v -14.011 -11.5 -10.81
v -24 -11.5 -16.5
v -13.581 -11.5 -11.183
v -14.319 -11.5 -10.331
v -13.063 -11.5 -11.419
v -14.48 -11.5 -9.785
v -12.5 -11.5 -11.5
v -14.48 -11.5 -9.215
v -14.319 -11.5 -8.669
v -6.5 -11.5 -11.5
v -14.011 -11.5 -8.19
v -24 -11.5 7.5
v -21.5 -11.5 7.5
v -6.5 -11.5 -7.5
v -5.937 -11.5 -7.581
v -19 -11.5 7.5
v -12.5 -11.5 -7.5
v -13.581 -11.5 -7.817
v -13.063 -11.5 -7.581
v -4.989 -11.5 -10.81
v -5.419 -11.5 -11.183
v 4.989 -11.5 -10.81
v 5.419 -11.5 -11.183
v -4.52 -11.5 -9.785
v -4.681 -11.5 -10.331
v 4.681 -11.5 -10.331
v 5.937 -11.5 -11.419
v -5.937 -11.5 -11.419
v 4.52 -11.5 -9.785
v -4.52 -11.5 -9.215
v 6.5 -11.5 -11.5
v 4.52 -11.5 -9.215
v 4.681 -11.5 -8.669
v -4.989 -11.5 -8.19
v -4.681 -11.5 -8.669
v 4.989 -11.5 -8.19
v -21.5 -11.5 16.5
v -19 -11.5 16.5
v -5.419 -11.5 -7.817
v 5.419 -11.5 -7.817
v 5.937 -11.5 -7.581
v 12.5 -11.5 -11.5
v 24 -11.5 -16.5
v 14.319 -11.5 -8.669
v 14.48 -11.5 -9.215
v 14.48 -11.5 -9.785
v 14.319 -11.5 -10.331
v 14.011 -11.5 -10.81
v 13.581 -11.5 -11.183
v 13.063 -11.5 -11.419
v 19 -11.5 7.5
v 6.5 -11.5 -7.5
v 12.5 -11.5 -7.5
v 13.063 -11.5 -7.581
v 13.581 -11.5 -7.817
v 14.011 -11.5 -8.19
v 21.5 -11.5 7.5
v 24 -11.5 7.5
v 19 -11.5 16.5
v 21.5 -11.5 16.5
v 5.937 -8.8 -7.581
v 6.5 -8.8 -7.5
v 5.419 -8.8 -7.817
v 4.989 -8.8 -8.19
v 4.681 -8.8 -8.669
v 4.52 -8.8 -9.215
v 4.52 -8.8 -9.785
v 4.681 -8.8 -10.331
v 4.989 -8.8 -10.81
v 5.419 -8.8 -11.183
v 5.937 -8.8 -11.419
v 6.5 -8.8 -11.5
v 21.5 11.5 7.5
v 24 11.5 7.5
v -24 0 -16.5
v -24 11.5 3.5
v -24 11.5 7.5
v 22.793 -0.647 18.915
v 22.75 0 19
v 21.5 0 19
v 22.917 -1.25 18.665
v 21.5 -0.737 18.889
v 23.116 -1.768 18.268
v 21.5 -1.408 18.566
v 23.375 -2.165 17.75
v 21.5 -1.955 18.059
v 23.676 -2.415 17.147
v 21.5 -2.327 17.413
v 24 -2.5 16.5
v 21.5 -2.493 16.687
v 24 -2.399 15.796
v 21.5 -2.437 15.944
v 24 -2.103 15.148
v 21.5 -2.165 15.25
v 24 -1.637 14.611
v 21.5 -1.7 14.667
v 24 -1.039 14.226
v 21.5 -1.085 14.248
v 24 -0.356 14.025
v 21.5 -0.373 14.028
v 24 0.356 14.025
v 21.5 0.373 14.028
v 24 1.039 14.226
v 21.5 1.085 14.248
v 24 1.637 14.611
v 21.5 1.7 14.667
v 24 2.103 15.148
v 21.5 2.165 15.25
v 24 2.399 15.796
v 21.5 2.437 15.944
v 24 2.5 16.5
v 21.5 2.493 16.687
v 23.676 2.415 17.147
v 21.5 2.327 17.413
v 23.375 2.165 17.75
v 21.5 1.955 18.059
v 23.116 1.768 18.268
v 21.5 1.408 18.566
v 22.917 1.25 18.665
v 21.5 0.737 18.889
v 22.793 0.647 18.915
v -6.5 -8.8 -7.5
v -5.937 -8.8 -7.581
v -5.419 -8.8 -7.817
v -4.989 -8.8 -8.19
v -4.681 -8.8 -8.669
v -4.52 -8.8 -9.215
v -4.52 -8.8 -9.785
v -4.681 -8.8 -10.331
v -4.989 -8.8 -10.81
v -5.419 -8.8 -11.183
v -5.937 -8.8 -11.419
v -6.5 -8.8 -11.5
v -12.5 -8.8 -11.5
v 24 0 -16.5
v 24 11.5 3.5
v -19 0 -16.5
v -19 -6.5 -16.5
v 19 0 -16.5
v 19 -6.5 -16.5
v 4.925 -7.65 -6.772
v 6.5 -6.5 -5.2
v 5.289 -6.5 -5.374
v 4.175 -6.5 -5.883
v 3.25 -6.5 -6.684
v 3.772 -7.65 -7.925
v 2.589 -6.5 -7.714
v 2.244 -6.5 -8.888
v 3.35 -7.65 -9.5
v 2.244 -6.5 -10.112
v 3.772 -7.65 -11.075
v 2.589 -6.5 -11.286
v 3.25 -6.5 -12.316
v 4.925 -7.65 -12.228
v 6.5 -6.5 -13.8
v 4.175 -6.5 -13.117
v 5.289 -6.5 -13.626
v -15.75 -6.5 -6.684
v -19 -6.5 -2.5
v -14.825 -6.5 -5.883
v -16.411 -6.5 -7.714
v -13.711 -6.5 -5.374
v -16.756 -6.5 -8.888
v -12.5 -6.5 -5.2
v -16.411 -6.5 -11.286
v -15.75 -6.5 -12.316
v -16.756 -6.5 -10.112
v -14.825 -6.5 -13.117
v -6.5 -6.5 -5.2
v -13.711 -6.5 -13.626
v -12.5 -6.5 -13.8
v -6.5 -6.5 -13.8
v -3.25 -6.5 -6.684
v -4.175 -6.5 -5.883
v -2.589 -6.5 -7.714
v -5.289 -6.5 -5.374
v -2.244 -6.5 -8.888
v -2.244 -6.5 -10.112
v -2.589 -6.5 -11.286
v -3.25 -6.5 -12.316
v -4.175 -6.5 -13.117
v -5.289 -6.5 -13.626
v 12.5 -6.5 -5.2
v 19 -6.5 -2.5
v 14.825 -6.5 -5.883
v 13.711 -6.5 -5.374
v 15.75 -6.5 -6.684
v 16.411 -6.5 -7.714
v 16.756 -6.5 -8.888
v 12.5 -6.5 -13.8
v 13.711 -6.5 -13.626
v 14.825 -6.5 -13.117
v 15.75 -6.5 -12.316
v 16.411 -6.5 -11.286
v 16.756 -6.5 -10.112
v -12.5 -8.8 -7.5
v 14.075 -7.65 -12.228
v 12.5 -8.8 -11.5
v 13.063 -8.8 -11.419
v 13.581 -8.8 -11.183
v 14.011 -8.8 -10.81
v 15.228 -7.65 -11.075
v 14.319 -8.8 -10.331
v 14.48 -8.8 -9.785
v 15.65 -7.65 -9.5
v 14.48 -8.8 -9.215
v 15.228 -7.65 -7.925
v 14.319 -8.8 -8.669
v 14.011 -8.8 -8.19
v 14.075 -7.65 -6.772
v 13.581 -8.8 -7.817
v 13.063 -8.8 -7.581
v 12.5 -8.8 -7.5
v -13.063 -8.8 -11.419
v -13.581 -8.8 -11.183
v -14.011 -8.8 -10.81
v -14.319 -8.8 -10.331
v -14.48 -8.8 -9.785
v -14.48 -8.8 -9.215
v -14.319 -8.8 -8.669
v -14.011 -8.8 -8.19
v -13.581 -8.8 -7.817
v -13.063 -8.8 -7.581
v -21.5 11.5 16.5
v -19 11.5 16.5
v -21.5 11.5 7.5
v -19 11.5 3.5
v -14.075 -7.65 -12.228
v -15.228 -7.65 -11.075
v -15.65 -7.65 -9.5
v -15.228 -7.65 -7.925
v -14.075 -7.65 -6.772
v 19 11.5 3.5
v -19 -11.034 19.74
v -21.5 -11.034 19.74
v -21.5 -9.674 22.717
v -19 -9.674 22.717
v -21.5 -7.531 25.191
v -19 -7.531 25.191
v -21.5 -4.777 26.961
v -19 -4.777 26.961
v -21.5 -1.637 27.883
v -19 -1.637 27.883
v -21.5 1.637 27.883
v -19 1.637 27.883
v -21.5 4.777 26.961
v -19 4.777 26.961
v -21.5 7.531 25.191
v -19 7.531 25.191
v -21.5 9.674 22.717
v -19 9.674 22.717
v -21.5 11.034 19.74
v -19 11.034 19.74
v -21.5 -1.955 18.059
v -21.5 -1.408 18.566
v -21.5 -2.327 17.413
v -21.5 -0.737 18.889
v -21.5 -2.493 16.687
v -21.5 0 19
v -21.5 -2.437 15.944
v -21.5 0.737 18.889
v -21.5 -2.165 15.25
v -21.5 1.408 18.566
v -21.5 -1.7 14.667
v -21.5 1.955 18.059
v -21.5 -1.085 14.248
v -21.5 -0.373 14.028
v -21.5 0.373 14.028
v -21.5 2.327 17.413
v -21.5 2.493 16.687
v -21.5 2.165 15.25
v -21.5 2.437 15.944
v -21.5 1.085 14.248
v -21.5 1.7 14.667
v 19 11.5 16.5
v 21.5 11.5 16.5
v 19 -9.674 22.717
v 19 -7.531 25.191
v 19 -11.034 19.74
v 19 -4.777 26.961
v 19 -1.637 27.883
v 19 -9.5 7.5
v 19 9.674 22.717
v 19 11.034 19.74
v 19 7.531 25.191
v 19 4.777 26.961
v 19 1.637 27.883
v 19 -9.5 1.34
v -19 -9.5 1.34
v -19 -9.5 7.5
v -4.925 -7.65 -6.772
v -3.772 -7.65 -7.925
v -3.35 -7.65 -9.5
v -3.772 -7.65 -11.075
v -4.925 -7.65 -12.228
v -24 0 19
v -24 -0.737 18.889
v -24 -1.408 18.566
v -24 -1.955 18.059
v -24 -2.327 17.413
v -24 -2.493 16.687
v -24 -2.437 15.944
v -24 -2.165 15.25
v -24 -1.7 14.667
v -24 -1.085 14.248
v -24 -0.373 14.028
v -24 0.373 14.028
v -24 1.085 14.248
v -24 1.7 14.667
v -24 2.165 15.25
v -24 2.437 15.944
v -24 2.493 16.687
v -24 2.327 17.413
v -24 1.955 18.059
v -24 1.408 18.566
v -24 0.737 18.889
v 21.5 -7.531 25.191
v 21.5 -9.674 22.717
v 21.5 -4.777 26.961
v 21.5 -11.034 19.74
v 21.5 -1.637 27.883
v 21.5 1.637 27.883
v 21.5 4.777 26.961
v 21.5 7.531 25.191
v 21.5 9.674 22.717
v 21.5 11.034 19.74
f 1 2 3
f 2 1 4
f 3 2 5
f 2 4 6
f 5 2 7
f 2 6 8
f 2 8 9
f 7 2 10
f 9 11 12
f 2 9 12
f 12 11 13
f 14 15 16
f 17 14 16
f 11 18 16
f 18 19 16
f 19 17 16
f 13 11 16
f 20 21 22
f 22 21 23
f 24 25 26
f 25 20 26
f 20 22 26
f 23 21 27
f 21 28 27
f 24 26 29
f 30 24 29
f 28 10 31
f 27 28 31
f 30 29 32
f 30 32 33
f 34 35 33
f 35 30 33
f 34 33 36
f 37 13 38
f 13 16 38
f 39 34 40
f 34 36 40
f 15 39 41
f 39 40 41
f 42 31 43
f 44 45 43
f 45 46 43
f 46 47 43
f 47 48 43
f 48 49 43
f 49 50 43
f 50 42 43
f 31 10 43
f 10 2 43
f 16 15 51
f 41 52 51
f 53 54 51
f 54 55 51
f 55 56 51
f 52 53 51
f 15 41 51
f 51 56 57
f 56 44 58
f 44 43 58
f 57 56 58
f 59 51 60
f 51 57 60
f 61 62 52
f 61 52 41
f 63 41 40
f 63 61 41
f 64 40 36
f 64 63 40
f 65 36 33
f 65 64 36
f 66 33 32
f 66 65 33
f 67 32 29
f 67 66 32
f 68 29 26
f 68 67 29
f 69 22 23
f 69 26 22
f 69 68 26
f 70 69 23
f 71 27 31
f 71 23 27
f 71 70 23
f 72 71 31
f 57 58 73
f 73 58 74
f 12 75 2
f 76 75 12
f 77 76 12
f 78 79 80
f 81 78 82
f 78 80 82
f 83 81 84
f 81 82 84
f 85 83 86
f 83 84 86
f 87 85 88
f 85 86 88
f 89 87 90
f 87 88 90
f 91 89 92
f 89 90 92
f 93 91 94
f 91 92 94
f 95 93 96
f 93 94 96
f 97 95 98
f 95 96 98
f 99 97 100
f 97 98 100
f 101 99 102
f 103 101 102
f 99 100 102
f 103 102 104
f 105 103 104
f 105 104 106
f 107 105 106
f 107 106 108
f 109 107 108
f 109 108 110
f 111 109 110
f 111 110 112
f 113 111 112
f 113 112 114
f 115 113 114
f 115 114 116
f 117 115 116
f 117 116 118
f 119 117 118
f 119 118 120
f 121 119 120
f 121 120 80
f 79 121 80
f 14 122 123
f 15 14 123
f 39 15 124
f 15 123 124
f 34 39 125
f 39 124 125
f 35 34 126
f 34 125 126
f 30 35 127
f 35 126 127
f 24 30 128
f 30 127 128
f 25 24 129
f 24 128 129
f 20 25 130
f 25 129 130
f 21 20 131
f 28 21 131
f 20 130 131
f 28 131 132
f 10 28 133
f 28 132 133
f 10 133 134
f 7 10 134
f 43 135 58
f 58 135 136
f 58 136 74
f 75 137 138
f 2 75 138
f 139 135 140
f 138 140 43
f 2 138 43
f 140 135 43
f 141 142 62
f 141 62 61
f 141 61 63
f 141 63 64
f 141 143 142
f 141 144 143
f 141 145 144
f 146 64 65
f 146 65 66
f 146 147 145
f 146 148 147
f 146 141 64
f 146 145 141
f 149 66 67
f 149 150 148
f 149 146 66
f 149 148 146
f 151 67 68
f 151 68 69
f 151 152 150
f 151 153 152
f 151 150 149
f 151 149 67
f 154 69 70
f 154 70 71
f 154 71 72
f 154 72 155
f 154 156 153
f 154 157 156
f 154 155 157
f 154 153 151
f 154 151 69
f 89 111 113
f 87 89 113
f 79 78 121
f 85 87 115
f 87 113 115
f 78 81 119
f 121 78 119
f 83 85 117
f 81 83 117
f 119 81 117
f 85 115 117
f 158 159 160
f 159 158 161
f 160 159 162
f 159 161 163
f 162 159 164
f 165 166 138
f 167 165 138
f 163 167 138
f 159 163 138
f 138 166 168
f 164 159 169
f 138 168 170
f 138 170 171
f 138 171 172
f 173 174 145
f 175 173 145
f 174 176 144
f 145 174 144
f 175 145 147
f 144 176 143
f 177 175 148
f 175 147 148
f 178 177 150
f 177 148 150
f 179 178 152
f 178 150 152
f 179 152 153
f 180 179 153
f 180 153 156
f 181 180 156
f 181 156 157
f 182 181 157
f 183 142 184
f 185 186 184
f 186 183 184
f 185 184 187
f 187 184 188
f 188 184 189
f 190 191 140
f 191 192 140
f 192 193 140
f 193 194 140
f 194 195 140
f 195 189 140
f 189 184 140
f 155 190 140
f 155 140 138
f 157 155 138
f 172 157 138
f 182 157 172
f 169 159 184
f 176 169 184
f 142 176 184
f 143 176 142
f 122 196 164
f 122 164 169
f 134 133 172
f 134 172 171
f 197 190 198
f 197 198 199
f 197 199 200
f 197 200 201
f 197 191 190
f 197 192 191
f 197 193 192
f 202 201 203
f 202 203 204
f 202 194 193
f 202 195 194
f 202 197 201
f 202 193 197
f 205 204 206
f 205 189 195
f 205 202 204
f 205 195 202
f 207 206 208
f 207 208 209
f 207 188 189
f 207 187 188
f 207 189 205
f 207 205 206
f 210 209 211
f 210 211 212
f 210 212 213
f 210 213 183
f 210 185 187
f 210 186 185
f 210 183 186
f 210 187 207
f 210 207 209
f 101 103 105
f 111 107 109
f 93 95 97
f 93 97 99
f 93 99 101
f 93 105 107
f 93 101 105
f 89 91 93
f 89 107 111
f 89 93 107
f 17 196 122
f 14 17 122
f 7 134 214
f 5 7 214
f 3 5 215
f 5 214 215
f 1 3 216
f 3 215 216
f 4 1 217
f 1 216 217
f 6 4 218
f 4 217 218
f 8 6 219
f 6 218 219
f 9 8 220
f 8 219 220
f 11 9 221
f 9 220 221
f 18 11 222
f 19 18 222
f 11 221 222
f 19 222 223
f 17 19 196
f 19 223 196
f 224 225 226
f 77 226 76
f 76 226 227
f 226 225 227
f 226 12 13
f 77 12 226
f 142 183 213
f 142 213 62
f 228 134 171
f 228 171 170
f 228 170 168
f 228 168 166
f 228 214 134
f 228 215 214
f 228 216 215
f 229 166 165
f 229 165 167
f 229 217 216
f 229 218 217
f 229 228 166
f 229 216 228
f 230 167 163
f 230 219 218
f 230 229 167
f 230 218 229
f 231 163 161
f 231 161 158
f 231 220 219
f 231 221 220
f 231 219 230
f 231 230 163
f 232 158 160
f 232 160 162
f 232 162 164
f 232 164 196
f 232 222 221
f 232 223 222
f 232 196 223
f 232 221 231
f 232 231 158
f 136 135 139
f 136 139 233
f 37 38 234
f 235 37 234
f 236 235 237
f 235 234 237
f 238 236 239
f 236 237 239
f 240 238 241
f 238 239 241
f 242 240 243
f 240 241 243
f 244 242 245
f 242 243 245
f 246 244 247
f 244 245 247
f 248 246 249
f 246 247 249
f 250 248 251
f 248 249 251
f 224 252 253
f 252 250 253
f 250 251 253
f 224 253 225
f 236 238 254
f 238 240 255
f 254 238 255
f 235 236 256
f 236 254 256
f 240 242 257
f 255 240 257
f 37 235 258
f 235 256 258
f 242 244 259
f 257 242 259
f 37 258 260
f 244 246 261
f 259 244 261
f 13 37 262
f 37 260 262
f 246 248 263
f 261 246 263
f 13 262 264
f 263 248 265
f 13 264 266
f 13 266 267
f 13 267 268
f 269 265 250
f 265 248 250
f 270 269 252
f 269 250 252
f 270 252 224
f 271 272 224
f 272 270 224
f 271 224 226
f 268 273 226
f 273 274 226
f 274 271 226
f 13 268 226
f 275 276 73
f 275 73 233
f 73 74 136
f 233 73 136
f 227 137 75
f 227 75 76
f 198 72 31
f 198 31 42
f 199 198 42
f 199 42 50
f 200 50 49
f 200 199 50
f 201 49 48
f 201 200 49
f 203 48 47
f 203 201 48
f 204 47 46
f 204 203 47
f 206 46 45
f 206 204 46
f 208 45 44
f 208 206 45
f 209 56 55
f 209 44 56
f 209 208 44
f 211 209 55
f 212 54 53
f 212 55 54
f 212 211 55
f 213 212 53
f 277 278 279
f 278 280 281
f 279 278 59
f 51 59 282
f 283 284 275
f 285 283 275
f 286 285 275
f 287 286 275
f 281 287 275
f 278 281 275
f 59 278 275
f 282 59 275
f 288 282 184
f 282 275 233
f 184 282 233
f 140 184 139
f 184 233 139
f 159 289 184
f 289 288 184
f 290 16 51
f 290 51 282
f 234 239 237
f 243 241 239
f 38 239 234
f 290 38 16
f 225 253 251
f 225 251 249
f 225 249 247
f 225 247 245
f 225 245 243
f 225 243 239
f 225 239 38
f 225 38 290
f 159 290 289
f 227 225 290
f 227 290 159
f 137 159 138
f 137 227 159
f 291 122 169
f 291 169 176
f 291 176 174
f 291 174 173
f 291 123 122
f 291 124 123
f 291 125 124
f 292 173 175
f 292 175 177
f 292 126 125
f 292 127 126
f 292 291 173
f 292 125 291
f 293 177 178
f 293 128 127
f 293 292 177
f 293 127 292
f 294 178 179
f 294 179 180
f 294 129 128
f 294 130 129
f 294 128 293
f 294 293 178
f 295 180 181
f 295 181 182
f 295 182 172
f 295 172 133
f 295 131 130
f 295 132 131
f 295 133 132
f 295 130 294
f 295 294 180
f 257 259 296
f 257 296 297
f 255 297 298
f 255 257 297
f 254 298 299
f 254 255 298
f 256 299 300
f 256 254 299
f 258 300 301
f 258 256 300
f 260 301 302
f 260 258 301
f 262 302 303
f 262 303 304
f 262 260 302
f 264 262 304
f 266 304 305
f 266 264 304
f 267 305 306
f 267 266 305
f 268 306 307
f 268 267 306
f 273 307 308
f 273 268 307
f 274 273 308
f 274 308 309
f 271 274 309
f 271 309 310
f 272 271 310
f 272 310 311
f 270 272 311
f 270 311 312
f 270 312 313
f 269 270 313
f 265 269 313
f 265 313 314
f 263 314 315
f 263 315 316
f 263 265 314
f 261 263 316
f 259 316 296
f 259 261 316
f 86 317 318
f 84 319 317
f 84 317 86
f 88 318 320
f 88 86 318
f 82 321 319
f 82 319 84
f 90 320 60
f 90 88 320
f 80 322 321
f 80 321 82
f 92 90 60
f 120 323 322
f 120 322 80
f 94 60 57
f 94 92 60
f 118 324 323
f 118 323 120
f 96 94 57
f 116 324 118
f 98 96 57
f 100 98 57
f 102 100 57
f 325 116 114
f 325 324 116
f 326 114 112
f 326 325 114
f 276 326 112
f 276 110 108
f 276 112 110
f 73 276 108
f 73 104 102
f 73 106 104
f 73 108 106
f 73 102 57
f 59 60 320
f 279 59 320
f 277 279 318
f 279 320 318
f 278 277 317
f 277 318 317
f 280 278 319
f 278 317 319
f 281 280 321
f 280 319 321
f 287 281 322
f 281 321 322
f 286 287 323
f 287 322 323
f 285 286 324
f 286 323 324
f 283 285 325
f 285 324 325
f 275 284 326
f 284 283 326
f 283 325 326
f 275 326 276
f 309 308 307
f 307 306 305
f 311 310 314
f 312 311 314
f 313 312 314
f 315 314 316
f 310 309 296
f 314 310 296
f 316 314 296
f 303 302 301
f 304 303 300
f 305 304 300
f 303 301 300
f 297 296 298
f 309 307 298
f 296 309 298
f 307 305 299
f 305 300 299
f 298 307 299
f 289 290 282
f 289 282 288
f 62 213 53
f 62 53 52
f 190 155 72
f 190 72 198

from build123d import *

# Parameters (mm, degrees)
BOSS_EXTRUDE1_DEPTH      = 24
CUT_EXTRUDE1_DEPTH       = 48
CUT_EXTRUDE2_DEPTH       = 19
CUT_EXTRUDE3_DEPTH       = 42.036569057
CHAMFER1_SIZE            = 2.3
SKETCH6_W                = 20.5
SKETCH6_H                = 23
CUT_EXTRUDE4_DEPTH       = 2.5
SKETCH7_R                = 2.5
BOSS_EXTRUDE2_DEPTH      = 2.5
CUT_EXTRUDE5_DEPTH       = 44.462627624
CHAMFER1_OF_MIRROR1_SIZE = 2.3


with BuildPart() as part:
    # Sketch1 → Boss-Extrude1 (new, symmetric)
    with BuildSketch(Plane(origin=(0, 0, 0), x_dir=(0, 0, -1), z_dir=(1, 0, 0))):
        with BuildLine():
            Line((16.5, -11.5), (-16.5, -11.5))
            ThreePointArc((-16.5, -11.5), (-28, 0), (-16.5, 11.5))
            Line((-16.5, 11.5), (16.5, 11.5))
            Line((16.5, 11.5), (16.5, -11.5))
        make_face()
    extrude(amount=BOSS_EXTRUDE1_DEPTH, both=True)

    # Sketch2 → Cut-Extrude1 (cut)
    with BuildSketch(Plane(origin=(24, 0, 0), x_dir=(0, 0, -1), z_dir=(1, 0, 0))):
        Polygon((16.5, 0), (-3.5, 11.5), (16.5, 11.5), align=None)
    extrude(amount=-CUT_EXTRUDE1_DEPTH, mode=Mode.SUBTRACT)

    # Sketch4 → Cut-Extrude2 (cut, symmetric)
    with BuildSketch(Plane(origin=(0, 0, 0), x_dir=(0, 0, -1), z_dir=(1, 0, 0))):
        with BuildLine():
            Line((16.5, -6.5), (16.5, 0))
            Line((16.5, 0), (-3.5, 11.5))
            Line((-3.5, 11.5), (-16.5, 11.5))
            ThreePointArc((-16.5, 11.5), (-28, 0), (-16.5, -11.5))
            Line((-16.5, -11.5), (-7.5, -11.5))
            Line((-7.5, -11.5), (-7.5, -9.5))
            Line((-7.5, -9.5), (-1.339824897, -9.5))
            Line((-1.339824897, -9.5), (2.5, -6.5))
            Line((2.5, -6.5), (16.5, -6.5))
        make_face()
    extrude(amount=CUT_EXTRUDE2_DEPTH, both=True, mode=Mode.SUBTRACT)

    # Sketch5 → Cut-Extrude3 (cut, through all)
    with BuildSketch(Plane(origin=(0, -6.5, 0), x_dir=(1, 0, 0), z_dir=(0, 1, 0))):
        with BuildLine():
            Line((6.5, 11.5), (12.5, 11.5))
            ThreePointArc((12.5, 11.5), (14.5, 9.5), (12.5, 7.5))
            Line((12.5, 7.5), (6.5, 7.5))
            ThreePointArc((6.5, 7.5), (4.5, 9.5), (6.5, 11.5))
        make_face()
    cut_extrude3 = extrude(amount=-CUT_EXTRUDE3_DEPTH, mode=Mode.SUBTRACT)

    # Chamfer1
    chamfer1_edges = [part.edges().sort_by_distance(p)[0] for p in [
        (4.5, -6.5, -9.5),
        (9.5, -6.5, -7.5),
        (14.5, -6.5, -9.5),
        (9.5, -6.5, -11.5),
    ]]
    chamfer(chamfer1_edges, length=CHAMFER1_SIZE)

    # Sketch6 → Cut-Extrude4 (cut)
    with BuildSketch(Plane(origin=(24, 0, 0), x_dir=(0, 0, -1), z_dir=(1, 0, 0))):
        with Locations((-17.75, 0)):
            Rectangle(SKETCH6_W, SKETCH6_H)
    cut_extrude4 = extrude(amount=-CUT_EXTRUDE4_DEPTH, mode=Mode.SUBTRACT)

    # Sketch7 → Boss-Extrude2 (add)
    with BuildSketch(Plane(origin=(21.5, 0, 0), x_dir=(0, 0, -1), z_dir=(1, 0, 0))):
        with Locations(Location((-16.5, 0, 0), (0, 0, 180))):
            Circle(SKETCH7_R)
    boss_extrude2 = extrude(amount=BOSS_EXTRUDE2_DEPTH)

    # Sketch8 → Cut-Extrude5 (cut, through all)
    with BuildSketch(Plane(origin=(0, 11.5, 0), x_dir=(1, 0, 0), z_dir=(0, 1, 0))):
        Polygon((24, -16.5), (22.75, -19), (24, -19), align=None)
    extrude(amount=-CUT_EXTRUDE5_DEPTH, mode=Mode.SUBTRACT)

    # Mirror1: Cut-Extrude3, Cut-Extrude4, Boss-Extrude2 across plane
    add(cut_extrude3.mirror(Plane(origin=(0, 0, 0), x_dir=(0, 0, 1), z_dir=(1, 0, 0))), mode=Mode.SUBTRACT)
    add(cut_extrude4.mirror(Plane(origin=(0, 0, 0), x_dir=(0, 0, 1), z_dir=(1, 0, 0))), mode=Mode.SUBTRACT)
    add(boss_extrude2.mirror(Plane(origin=(0, 0, 0), x_dir=(0, 0, 1), z_dir=(1, 0, 0))))

    # Chamfer1 of Mirror1
    chamfer1_of_mirror1_edges = [part.edges().sort_by_distance(p)[0] for p in [
        (-4.5, -6.5, -9.5),
        (-9.5, -6.5, -7.5),
        (-14.5, -6.5, -9.5),
        (-9.5, -6.5, -11.5),
    ]]
    chamfer(chamfer1_of_mirror1_edges, length=CHAMFER1_OF_MIRROR1_SIZE)


solid = part.part
